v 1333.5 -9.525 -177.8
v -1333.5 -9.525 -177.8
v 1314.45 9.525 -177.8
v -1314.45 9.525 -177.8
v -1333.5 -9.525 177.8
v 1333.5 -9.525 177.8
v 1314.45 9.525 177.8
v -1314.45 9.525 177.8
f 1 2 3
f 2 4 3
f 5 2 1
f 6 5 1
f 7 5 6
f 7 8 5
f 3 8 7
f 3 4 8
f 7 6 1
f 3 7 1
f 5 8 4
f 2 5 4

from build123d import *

# Parameters (mm, degrees)
SKETCH1_W           = 2667
SKETCH1_H           = 355.6
BOSS_EXTRUDE1_DEPTH = 9.525
CHAMFER1_SIZE       = 19.05


with BuildPart() as part:
    # Sketch1 → Boss-Extrude1 (new, symmetric)
    with BuildSketch(Plane(origin=(0, 0, 0), x_dir=(1, 0, 0), z_dir=(0, 1, 0))):
        Rectangle(SKETCH1_W, SKETCH1_H)
    extrude(amount=BOSS_EXTRUDE1_DEPTH, both=True)

    # Chamfer1
    chamfer1_edges = [part.edges().sort_by_distance(p)[0] for p in [
        (1333.5, 9.525, 0),
        (-1333.5, 9.525, 0),
    ]]
    chamfer(chamfer1_edges, length=CHAMFER1_SIZE - 0.0001)  # a hair under: the kernel refuses the full size


solid = part.part
